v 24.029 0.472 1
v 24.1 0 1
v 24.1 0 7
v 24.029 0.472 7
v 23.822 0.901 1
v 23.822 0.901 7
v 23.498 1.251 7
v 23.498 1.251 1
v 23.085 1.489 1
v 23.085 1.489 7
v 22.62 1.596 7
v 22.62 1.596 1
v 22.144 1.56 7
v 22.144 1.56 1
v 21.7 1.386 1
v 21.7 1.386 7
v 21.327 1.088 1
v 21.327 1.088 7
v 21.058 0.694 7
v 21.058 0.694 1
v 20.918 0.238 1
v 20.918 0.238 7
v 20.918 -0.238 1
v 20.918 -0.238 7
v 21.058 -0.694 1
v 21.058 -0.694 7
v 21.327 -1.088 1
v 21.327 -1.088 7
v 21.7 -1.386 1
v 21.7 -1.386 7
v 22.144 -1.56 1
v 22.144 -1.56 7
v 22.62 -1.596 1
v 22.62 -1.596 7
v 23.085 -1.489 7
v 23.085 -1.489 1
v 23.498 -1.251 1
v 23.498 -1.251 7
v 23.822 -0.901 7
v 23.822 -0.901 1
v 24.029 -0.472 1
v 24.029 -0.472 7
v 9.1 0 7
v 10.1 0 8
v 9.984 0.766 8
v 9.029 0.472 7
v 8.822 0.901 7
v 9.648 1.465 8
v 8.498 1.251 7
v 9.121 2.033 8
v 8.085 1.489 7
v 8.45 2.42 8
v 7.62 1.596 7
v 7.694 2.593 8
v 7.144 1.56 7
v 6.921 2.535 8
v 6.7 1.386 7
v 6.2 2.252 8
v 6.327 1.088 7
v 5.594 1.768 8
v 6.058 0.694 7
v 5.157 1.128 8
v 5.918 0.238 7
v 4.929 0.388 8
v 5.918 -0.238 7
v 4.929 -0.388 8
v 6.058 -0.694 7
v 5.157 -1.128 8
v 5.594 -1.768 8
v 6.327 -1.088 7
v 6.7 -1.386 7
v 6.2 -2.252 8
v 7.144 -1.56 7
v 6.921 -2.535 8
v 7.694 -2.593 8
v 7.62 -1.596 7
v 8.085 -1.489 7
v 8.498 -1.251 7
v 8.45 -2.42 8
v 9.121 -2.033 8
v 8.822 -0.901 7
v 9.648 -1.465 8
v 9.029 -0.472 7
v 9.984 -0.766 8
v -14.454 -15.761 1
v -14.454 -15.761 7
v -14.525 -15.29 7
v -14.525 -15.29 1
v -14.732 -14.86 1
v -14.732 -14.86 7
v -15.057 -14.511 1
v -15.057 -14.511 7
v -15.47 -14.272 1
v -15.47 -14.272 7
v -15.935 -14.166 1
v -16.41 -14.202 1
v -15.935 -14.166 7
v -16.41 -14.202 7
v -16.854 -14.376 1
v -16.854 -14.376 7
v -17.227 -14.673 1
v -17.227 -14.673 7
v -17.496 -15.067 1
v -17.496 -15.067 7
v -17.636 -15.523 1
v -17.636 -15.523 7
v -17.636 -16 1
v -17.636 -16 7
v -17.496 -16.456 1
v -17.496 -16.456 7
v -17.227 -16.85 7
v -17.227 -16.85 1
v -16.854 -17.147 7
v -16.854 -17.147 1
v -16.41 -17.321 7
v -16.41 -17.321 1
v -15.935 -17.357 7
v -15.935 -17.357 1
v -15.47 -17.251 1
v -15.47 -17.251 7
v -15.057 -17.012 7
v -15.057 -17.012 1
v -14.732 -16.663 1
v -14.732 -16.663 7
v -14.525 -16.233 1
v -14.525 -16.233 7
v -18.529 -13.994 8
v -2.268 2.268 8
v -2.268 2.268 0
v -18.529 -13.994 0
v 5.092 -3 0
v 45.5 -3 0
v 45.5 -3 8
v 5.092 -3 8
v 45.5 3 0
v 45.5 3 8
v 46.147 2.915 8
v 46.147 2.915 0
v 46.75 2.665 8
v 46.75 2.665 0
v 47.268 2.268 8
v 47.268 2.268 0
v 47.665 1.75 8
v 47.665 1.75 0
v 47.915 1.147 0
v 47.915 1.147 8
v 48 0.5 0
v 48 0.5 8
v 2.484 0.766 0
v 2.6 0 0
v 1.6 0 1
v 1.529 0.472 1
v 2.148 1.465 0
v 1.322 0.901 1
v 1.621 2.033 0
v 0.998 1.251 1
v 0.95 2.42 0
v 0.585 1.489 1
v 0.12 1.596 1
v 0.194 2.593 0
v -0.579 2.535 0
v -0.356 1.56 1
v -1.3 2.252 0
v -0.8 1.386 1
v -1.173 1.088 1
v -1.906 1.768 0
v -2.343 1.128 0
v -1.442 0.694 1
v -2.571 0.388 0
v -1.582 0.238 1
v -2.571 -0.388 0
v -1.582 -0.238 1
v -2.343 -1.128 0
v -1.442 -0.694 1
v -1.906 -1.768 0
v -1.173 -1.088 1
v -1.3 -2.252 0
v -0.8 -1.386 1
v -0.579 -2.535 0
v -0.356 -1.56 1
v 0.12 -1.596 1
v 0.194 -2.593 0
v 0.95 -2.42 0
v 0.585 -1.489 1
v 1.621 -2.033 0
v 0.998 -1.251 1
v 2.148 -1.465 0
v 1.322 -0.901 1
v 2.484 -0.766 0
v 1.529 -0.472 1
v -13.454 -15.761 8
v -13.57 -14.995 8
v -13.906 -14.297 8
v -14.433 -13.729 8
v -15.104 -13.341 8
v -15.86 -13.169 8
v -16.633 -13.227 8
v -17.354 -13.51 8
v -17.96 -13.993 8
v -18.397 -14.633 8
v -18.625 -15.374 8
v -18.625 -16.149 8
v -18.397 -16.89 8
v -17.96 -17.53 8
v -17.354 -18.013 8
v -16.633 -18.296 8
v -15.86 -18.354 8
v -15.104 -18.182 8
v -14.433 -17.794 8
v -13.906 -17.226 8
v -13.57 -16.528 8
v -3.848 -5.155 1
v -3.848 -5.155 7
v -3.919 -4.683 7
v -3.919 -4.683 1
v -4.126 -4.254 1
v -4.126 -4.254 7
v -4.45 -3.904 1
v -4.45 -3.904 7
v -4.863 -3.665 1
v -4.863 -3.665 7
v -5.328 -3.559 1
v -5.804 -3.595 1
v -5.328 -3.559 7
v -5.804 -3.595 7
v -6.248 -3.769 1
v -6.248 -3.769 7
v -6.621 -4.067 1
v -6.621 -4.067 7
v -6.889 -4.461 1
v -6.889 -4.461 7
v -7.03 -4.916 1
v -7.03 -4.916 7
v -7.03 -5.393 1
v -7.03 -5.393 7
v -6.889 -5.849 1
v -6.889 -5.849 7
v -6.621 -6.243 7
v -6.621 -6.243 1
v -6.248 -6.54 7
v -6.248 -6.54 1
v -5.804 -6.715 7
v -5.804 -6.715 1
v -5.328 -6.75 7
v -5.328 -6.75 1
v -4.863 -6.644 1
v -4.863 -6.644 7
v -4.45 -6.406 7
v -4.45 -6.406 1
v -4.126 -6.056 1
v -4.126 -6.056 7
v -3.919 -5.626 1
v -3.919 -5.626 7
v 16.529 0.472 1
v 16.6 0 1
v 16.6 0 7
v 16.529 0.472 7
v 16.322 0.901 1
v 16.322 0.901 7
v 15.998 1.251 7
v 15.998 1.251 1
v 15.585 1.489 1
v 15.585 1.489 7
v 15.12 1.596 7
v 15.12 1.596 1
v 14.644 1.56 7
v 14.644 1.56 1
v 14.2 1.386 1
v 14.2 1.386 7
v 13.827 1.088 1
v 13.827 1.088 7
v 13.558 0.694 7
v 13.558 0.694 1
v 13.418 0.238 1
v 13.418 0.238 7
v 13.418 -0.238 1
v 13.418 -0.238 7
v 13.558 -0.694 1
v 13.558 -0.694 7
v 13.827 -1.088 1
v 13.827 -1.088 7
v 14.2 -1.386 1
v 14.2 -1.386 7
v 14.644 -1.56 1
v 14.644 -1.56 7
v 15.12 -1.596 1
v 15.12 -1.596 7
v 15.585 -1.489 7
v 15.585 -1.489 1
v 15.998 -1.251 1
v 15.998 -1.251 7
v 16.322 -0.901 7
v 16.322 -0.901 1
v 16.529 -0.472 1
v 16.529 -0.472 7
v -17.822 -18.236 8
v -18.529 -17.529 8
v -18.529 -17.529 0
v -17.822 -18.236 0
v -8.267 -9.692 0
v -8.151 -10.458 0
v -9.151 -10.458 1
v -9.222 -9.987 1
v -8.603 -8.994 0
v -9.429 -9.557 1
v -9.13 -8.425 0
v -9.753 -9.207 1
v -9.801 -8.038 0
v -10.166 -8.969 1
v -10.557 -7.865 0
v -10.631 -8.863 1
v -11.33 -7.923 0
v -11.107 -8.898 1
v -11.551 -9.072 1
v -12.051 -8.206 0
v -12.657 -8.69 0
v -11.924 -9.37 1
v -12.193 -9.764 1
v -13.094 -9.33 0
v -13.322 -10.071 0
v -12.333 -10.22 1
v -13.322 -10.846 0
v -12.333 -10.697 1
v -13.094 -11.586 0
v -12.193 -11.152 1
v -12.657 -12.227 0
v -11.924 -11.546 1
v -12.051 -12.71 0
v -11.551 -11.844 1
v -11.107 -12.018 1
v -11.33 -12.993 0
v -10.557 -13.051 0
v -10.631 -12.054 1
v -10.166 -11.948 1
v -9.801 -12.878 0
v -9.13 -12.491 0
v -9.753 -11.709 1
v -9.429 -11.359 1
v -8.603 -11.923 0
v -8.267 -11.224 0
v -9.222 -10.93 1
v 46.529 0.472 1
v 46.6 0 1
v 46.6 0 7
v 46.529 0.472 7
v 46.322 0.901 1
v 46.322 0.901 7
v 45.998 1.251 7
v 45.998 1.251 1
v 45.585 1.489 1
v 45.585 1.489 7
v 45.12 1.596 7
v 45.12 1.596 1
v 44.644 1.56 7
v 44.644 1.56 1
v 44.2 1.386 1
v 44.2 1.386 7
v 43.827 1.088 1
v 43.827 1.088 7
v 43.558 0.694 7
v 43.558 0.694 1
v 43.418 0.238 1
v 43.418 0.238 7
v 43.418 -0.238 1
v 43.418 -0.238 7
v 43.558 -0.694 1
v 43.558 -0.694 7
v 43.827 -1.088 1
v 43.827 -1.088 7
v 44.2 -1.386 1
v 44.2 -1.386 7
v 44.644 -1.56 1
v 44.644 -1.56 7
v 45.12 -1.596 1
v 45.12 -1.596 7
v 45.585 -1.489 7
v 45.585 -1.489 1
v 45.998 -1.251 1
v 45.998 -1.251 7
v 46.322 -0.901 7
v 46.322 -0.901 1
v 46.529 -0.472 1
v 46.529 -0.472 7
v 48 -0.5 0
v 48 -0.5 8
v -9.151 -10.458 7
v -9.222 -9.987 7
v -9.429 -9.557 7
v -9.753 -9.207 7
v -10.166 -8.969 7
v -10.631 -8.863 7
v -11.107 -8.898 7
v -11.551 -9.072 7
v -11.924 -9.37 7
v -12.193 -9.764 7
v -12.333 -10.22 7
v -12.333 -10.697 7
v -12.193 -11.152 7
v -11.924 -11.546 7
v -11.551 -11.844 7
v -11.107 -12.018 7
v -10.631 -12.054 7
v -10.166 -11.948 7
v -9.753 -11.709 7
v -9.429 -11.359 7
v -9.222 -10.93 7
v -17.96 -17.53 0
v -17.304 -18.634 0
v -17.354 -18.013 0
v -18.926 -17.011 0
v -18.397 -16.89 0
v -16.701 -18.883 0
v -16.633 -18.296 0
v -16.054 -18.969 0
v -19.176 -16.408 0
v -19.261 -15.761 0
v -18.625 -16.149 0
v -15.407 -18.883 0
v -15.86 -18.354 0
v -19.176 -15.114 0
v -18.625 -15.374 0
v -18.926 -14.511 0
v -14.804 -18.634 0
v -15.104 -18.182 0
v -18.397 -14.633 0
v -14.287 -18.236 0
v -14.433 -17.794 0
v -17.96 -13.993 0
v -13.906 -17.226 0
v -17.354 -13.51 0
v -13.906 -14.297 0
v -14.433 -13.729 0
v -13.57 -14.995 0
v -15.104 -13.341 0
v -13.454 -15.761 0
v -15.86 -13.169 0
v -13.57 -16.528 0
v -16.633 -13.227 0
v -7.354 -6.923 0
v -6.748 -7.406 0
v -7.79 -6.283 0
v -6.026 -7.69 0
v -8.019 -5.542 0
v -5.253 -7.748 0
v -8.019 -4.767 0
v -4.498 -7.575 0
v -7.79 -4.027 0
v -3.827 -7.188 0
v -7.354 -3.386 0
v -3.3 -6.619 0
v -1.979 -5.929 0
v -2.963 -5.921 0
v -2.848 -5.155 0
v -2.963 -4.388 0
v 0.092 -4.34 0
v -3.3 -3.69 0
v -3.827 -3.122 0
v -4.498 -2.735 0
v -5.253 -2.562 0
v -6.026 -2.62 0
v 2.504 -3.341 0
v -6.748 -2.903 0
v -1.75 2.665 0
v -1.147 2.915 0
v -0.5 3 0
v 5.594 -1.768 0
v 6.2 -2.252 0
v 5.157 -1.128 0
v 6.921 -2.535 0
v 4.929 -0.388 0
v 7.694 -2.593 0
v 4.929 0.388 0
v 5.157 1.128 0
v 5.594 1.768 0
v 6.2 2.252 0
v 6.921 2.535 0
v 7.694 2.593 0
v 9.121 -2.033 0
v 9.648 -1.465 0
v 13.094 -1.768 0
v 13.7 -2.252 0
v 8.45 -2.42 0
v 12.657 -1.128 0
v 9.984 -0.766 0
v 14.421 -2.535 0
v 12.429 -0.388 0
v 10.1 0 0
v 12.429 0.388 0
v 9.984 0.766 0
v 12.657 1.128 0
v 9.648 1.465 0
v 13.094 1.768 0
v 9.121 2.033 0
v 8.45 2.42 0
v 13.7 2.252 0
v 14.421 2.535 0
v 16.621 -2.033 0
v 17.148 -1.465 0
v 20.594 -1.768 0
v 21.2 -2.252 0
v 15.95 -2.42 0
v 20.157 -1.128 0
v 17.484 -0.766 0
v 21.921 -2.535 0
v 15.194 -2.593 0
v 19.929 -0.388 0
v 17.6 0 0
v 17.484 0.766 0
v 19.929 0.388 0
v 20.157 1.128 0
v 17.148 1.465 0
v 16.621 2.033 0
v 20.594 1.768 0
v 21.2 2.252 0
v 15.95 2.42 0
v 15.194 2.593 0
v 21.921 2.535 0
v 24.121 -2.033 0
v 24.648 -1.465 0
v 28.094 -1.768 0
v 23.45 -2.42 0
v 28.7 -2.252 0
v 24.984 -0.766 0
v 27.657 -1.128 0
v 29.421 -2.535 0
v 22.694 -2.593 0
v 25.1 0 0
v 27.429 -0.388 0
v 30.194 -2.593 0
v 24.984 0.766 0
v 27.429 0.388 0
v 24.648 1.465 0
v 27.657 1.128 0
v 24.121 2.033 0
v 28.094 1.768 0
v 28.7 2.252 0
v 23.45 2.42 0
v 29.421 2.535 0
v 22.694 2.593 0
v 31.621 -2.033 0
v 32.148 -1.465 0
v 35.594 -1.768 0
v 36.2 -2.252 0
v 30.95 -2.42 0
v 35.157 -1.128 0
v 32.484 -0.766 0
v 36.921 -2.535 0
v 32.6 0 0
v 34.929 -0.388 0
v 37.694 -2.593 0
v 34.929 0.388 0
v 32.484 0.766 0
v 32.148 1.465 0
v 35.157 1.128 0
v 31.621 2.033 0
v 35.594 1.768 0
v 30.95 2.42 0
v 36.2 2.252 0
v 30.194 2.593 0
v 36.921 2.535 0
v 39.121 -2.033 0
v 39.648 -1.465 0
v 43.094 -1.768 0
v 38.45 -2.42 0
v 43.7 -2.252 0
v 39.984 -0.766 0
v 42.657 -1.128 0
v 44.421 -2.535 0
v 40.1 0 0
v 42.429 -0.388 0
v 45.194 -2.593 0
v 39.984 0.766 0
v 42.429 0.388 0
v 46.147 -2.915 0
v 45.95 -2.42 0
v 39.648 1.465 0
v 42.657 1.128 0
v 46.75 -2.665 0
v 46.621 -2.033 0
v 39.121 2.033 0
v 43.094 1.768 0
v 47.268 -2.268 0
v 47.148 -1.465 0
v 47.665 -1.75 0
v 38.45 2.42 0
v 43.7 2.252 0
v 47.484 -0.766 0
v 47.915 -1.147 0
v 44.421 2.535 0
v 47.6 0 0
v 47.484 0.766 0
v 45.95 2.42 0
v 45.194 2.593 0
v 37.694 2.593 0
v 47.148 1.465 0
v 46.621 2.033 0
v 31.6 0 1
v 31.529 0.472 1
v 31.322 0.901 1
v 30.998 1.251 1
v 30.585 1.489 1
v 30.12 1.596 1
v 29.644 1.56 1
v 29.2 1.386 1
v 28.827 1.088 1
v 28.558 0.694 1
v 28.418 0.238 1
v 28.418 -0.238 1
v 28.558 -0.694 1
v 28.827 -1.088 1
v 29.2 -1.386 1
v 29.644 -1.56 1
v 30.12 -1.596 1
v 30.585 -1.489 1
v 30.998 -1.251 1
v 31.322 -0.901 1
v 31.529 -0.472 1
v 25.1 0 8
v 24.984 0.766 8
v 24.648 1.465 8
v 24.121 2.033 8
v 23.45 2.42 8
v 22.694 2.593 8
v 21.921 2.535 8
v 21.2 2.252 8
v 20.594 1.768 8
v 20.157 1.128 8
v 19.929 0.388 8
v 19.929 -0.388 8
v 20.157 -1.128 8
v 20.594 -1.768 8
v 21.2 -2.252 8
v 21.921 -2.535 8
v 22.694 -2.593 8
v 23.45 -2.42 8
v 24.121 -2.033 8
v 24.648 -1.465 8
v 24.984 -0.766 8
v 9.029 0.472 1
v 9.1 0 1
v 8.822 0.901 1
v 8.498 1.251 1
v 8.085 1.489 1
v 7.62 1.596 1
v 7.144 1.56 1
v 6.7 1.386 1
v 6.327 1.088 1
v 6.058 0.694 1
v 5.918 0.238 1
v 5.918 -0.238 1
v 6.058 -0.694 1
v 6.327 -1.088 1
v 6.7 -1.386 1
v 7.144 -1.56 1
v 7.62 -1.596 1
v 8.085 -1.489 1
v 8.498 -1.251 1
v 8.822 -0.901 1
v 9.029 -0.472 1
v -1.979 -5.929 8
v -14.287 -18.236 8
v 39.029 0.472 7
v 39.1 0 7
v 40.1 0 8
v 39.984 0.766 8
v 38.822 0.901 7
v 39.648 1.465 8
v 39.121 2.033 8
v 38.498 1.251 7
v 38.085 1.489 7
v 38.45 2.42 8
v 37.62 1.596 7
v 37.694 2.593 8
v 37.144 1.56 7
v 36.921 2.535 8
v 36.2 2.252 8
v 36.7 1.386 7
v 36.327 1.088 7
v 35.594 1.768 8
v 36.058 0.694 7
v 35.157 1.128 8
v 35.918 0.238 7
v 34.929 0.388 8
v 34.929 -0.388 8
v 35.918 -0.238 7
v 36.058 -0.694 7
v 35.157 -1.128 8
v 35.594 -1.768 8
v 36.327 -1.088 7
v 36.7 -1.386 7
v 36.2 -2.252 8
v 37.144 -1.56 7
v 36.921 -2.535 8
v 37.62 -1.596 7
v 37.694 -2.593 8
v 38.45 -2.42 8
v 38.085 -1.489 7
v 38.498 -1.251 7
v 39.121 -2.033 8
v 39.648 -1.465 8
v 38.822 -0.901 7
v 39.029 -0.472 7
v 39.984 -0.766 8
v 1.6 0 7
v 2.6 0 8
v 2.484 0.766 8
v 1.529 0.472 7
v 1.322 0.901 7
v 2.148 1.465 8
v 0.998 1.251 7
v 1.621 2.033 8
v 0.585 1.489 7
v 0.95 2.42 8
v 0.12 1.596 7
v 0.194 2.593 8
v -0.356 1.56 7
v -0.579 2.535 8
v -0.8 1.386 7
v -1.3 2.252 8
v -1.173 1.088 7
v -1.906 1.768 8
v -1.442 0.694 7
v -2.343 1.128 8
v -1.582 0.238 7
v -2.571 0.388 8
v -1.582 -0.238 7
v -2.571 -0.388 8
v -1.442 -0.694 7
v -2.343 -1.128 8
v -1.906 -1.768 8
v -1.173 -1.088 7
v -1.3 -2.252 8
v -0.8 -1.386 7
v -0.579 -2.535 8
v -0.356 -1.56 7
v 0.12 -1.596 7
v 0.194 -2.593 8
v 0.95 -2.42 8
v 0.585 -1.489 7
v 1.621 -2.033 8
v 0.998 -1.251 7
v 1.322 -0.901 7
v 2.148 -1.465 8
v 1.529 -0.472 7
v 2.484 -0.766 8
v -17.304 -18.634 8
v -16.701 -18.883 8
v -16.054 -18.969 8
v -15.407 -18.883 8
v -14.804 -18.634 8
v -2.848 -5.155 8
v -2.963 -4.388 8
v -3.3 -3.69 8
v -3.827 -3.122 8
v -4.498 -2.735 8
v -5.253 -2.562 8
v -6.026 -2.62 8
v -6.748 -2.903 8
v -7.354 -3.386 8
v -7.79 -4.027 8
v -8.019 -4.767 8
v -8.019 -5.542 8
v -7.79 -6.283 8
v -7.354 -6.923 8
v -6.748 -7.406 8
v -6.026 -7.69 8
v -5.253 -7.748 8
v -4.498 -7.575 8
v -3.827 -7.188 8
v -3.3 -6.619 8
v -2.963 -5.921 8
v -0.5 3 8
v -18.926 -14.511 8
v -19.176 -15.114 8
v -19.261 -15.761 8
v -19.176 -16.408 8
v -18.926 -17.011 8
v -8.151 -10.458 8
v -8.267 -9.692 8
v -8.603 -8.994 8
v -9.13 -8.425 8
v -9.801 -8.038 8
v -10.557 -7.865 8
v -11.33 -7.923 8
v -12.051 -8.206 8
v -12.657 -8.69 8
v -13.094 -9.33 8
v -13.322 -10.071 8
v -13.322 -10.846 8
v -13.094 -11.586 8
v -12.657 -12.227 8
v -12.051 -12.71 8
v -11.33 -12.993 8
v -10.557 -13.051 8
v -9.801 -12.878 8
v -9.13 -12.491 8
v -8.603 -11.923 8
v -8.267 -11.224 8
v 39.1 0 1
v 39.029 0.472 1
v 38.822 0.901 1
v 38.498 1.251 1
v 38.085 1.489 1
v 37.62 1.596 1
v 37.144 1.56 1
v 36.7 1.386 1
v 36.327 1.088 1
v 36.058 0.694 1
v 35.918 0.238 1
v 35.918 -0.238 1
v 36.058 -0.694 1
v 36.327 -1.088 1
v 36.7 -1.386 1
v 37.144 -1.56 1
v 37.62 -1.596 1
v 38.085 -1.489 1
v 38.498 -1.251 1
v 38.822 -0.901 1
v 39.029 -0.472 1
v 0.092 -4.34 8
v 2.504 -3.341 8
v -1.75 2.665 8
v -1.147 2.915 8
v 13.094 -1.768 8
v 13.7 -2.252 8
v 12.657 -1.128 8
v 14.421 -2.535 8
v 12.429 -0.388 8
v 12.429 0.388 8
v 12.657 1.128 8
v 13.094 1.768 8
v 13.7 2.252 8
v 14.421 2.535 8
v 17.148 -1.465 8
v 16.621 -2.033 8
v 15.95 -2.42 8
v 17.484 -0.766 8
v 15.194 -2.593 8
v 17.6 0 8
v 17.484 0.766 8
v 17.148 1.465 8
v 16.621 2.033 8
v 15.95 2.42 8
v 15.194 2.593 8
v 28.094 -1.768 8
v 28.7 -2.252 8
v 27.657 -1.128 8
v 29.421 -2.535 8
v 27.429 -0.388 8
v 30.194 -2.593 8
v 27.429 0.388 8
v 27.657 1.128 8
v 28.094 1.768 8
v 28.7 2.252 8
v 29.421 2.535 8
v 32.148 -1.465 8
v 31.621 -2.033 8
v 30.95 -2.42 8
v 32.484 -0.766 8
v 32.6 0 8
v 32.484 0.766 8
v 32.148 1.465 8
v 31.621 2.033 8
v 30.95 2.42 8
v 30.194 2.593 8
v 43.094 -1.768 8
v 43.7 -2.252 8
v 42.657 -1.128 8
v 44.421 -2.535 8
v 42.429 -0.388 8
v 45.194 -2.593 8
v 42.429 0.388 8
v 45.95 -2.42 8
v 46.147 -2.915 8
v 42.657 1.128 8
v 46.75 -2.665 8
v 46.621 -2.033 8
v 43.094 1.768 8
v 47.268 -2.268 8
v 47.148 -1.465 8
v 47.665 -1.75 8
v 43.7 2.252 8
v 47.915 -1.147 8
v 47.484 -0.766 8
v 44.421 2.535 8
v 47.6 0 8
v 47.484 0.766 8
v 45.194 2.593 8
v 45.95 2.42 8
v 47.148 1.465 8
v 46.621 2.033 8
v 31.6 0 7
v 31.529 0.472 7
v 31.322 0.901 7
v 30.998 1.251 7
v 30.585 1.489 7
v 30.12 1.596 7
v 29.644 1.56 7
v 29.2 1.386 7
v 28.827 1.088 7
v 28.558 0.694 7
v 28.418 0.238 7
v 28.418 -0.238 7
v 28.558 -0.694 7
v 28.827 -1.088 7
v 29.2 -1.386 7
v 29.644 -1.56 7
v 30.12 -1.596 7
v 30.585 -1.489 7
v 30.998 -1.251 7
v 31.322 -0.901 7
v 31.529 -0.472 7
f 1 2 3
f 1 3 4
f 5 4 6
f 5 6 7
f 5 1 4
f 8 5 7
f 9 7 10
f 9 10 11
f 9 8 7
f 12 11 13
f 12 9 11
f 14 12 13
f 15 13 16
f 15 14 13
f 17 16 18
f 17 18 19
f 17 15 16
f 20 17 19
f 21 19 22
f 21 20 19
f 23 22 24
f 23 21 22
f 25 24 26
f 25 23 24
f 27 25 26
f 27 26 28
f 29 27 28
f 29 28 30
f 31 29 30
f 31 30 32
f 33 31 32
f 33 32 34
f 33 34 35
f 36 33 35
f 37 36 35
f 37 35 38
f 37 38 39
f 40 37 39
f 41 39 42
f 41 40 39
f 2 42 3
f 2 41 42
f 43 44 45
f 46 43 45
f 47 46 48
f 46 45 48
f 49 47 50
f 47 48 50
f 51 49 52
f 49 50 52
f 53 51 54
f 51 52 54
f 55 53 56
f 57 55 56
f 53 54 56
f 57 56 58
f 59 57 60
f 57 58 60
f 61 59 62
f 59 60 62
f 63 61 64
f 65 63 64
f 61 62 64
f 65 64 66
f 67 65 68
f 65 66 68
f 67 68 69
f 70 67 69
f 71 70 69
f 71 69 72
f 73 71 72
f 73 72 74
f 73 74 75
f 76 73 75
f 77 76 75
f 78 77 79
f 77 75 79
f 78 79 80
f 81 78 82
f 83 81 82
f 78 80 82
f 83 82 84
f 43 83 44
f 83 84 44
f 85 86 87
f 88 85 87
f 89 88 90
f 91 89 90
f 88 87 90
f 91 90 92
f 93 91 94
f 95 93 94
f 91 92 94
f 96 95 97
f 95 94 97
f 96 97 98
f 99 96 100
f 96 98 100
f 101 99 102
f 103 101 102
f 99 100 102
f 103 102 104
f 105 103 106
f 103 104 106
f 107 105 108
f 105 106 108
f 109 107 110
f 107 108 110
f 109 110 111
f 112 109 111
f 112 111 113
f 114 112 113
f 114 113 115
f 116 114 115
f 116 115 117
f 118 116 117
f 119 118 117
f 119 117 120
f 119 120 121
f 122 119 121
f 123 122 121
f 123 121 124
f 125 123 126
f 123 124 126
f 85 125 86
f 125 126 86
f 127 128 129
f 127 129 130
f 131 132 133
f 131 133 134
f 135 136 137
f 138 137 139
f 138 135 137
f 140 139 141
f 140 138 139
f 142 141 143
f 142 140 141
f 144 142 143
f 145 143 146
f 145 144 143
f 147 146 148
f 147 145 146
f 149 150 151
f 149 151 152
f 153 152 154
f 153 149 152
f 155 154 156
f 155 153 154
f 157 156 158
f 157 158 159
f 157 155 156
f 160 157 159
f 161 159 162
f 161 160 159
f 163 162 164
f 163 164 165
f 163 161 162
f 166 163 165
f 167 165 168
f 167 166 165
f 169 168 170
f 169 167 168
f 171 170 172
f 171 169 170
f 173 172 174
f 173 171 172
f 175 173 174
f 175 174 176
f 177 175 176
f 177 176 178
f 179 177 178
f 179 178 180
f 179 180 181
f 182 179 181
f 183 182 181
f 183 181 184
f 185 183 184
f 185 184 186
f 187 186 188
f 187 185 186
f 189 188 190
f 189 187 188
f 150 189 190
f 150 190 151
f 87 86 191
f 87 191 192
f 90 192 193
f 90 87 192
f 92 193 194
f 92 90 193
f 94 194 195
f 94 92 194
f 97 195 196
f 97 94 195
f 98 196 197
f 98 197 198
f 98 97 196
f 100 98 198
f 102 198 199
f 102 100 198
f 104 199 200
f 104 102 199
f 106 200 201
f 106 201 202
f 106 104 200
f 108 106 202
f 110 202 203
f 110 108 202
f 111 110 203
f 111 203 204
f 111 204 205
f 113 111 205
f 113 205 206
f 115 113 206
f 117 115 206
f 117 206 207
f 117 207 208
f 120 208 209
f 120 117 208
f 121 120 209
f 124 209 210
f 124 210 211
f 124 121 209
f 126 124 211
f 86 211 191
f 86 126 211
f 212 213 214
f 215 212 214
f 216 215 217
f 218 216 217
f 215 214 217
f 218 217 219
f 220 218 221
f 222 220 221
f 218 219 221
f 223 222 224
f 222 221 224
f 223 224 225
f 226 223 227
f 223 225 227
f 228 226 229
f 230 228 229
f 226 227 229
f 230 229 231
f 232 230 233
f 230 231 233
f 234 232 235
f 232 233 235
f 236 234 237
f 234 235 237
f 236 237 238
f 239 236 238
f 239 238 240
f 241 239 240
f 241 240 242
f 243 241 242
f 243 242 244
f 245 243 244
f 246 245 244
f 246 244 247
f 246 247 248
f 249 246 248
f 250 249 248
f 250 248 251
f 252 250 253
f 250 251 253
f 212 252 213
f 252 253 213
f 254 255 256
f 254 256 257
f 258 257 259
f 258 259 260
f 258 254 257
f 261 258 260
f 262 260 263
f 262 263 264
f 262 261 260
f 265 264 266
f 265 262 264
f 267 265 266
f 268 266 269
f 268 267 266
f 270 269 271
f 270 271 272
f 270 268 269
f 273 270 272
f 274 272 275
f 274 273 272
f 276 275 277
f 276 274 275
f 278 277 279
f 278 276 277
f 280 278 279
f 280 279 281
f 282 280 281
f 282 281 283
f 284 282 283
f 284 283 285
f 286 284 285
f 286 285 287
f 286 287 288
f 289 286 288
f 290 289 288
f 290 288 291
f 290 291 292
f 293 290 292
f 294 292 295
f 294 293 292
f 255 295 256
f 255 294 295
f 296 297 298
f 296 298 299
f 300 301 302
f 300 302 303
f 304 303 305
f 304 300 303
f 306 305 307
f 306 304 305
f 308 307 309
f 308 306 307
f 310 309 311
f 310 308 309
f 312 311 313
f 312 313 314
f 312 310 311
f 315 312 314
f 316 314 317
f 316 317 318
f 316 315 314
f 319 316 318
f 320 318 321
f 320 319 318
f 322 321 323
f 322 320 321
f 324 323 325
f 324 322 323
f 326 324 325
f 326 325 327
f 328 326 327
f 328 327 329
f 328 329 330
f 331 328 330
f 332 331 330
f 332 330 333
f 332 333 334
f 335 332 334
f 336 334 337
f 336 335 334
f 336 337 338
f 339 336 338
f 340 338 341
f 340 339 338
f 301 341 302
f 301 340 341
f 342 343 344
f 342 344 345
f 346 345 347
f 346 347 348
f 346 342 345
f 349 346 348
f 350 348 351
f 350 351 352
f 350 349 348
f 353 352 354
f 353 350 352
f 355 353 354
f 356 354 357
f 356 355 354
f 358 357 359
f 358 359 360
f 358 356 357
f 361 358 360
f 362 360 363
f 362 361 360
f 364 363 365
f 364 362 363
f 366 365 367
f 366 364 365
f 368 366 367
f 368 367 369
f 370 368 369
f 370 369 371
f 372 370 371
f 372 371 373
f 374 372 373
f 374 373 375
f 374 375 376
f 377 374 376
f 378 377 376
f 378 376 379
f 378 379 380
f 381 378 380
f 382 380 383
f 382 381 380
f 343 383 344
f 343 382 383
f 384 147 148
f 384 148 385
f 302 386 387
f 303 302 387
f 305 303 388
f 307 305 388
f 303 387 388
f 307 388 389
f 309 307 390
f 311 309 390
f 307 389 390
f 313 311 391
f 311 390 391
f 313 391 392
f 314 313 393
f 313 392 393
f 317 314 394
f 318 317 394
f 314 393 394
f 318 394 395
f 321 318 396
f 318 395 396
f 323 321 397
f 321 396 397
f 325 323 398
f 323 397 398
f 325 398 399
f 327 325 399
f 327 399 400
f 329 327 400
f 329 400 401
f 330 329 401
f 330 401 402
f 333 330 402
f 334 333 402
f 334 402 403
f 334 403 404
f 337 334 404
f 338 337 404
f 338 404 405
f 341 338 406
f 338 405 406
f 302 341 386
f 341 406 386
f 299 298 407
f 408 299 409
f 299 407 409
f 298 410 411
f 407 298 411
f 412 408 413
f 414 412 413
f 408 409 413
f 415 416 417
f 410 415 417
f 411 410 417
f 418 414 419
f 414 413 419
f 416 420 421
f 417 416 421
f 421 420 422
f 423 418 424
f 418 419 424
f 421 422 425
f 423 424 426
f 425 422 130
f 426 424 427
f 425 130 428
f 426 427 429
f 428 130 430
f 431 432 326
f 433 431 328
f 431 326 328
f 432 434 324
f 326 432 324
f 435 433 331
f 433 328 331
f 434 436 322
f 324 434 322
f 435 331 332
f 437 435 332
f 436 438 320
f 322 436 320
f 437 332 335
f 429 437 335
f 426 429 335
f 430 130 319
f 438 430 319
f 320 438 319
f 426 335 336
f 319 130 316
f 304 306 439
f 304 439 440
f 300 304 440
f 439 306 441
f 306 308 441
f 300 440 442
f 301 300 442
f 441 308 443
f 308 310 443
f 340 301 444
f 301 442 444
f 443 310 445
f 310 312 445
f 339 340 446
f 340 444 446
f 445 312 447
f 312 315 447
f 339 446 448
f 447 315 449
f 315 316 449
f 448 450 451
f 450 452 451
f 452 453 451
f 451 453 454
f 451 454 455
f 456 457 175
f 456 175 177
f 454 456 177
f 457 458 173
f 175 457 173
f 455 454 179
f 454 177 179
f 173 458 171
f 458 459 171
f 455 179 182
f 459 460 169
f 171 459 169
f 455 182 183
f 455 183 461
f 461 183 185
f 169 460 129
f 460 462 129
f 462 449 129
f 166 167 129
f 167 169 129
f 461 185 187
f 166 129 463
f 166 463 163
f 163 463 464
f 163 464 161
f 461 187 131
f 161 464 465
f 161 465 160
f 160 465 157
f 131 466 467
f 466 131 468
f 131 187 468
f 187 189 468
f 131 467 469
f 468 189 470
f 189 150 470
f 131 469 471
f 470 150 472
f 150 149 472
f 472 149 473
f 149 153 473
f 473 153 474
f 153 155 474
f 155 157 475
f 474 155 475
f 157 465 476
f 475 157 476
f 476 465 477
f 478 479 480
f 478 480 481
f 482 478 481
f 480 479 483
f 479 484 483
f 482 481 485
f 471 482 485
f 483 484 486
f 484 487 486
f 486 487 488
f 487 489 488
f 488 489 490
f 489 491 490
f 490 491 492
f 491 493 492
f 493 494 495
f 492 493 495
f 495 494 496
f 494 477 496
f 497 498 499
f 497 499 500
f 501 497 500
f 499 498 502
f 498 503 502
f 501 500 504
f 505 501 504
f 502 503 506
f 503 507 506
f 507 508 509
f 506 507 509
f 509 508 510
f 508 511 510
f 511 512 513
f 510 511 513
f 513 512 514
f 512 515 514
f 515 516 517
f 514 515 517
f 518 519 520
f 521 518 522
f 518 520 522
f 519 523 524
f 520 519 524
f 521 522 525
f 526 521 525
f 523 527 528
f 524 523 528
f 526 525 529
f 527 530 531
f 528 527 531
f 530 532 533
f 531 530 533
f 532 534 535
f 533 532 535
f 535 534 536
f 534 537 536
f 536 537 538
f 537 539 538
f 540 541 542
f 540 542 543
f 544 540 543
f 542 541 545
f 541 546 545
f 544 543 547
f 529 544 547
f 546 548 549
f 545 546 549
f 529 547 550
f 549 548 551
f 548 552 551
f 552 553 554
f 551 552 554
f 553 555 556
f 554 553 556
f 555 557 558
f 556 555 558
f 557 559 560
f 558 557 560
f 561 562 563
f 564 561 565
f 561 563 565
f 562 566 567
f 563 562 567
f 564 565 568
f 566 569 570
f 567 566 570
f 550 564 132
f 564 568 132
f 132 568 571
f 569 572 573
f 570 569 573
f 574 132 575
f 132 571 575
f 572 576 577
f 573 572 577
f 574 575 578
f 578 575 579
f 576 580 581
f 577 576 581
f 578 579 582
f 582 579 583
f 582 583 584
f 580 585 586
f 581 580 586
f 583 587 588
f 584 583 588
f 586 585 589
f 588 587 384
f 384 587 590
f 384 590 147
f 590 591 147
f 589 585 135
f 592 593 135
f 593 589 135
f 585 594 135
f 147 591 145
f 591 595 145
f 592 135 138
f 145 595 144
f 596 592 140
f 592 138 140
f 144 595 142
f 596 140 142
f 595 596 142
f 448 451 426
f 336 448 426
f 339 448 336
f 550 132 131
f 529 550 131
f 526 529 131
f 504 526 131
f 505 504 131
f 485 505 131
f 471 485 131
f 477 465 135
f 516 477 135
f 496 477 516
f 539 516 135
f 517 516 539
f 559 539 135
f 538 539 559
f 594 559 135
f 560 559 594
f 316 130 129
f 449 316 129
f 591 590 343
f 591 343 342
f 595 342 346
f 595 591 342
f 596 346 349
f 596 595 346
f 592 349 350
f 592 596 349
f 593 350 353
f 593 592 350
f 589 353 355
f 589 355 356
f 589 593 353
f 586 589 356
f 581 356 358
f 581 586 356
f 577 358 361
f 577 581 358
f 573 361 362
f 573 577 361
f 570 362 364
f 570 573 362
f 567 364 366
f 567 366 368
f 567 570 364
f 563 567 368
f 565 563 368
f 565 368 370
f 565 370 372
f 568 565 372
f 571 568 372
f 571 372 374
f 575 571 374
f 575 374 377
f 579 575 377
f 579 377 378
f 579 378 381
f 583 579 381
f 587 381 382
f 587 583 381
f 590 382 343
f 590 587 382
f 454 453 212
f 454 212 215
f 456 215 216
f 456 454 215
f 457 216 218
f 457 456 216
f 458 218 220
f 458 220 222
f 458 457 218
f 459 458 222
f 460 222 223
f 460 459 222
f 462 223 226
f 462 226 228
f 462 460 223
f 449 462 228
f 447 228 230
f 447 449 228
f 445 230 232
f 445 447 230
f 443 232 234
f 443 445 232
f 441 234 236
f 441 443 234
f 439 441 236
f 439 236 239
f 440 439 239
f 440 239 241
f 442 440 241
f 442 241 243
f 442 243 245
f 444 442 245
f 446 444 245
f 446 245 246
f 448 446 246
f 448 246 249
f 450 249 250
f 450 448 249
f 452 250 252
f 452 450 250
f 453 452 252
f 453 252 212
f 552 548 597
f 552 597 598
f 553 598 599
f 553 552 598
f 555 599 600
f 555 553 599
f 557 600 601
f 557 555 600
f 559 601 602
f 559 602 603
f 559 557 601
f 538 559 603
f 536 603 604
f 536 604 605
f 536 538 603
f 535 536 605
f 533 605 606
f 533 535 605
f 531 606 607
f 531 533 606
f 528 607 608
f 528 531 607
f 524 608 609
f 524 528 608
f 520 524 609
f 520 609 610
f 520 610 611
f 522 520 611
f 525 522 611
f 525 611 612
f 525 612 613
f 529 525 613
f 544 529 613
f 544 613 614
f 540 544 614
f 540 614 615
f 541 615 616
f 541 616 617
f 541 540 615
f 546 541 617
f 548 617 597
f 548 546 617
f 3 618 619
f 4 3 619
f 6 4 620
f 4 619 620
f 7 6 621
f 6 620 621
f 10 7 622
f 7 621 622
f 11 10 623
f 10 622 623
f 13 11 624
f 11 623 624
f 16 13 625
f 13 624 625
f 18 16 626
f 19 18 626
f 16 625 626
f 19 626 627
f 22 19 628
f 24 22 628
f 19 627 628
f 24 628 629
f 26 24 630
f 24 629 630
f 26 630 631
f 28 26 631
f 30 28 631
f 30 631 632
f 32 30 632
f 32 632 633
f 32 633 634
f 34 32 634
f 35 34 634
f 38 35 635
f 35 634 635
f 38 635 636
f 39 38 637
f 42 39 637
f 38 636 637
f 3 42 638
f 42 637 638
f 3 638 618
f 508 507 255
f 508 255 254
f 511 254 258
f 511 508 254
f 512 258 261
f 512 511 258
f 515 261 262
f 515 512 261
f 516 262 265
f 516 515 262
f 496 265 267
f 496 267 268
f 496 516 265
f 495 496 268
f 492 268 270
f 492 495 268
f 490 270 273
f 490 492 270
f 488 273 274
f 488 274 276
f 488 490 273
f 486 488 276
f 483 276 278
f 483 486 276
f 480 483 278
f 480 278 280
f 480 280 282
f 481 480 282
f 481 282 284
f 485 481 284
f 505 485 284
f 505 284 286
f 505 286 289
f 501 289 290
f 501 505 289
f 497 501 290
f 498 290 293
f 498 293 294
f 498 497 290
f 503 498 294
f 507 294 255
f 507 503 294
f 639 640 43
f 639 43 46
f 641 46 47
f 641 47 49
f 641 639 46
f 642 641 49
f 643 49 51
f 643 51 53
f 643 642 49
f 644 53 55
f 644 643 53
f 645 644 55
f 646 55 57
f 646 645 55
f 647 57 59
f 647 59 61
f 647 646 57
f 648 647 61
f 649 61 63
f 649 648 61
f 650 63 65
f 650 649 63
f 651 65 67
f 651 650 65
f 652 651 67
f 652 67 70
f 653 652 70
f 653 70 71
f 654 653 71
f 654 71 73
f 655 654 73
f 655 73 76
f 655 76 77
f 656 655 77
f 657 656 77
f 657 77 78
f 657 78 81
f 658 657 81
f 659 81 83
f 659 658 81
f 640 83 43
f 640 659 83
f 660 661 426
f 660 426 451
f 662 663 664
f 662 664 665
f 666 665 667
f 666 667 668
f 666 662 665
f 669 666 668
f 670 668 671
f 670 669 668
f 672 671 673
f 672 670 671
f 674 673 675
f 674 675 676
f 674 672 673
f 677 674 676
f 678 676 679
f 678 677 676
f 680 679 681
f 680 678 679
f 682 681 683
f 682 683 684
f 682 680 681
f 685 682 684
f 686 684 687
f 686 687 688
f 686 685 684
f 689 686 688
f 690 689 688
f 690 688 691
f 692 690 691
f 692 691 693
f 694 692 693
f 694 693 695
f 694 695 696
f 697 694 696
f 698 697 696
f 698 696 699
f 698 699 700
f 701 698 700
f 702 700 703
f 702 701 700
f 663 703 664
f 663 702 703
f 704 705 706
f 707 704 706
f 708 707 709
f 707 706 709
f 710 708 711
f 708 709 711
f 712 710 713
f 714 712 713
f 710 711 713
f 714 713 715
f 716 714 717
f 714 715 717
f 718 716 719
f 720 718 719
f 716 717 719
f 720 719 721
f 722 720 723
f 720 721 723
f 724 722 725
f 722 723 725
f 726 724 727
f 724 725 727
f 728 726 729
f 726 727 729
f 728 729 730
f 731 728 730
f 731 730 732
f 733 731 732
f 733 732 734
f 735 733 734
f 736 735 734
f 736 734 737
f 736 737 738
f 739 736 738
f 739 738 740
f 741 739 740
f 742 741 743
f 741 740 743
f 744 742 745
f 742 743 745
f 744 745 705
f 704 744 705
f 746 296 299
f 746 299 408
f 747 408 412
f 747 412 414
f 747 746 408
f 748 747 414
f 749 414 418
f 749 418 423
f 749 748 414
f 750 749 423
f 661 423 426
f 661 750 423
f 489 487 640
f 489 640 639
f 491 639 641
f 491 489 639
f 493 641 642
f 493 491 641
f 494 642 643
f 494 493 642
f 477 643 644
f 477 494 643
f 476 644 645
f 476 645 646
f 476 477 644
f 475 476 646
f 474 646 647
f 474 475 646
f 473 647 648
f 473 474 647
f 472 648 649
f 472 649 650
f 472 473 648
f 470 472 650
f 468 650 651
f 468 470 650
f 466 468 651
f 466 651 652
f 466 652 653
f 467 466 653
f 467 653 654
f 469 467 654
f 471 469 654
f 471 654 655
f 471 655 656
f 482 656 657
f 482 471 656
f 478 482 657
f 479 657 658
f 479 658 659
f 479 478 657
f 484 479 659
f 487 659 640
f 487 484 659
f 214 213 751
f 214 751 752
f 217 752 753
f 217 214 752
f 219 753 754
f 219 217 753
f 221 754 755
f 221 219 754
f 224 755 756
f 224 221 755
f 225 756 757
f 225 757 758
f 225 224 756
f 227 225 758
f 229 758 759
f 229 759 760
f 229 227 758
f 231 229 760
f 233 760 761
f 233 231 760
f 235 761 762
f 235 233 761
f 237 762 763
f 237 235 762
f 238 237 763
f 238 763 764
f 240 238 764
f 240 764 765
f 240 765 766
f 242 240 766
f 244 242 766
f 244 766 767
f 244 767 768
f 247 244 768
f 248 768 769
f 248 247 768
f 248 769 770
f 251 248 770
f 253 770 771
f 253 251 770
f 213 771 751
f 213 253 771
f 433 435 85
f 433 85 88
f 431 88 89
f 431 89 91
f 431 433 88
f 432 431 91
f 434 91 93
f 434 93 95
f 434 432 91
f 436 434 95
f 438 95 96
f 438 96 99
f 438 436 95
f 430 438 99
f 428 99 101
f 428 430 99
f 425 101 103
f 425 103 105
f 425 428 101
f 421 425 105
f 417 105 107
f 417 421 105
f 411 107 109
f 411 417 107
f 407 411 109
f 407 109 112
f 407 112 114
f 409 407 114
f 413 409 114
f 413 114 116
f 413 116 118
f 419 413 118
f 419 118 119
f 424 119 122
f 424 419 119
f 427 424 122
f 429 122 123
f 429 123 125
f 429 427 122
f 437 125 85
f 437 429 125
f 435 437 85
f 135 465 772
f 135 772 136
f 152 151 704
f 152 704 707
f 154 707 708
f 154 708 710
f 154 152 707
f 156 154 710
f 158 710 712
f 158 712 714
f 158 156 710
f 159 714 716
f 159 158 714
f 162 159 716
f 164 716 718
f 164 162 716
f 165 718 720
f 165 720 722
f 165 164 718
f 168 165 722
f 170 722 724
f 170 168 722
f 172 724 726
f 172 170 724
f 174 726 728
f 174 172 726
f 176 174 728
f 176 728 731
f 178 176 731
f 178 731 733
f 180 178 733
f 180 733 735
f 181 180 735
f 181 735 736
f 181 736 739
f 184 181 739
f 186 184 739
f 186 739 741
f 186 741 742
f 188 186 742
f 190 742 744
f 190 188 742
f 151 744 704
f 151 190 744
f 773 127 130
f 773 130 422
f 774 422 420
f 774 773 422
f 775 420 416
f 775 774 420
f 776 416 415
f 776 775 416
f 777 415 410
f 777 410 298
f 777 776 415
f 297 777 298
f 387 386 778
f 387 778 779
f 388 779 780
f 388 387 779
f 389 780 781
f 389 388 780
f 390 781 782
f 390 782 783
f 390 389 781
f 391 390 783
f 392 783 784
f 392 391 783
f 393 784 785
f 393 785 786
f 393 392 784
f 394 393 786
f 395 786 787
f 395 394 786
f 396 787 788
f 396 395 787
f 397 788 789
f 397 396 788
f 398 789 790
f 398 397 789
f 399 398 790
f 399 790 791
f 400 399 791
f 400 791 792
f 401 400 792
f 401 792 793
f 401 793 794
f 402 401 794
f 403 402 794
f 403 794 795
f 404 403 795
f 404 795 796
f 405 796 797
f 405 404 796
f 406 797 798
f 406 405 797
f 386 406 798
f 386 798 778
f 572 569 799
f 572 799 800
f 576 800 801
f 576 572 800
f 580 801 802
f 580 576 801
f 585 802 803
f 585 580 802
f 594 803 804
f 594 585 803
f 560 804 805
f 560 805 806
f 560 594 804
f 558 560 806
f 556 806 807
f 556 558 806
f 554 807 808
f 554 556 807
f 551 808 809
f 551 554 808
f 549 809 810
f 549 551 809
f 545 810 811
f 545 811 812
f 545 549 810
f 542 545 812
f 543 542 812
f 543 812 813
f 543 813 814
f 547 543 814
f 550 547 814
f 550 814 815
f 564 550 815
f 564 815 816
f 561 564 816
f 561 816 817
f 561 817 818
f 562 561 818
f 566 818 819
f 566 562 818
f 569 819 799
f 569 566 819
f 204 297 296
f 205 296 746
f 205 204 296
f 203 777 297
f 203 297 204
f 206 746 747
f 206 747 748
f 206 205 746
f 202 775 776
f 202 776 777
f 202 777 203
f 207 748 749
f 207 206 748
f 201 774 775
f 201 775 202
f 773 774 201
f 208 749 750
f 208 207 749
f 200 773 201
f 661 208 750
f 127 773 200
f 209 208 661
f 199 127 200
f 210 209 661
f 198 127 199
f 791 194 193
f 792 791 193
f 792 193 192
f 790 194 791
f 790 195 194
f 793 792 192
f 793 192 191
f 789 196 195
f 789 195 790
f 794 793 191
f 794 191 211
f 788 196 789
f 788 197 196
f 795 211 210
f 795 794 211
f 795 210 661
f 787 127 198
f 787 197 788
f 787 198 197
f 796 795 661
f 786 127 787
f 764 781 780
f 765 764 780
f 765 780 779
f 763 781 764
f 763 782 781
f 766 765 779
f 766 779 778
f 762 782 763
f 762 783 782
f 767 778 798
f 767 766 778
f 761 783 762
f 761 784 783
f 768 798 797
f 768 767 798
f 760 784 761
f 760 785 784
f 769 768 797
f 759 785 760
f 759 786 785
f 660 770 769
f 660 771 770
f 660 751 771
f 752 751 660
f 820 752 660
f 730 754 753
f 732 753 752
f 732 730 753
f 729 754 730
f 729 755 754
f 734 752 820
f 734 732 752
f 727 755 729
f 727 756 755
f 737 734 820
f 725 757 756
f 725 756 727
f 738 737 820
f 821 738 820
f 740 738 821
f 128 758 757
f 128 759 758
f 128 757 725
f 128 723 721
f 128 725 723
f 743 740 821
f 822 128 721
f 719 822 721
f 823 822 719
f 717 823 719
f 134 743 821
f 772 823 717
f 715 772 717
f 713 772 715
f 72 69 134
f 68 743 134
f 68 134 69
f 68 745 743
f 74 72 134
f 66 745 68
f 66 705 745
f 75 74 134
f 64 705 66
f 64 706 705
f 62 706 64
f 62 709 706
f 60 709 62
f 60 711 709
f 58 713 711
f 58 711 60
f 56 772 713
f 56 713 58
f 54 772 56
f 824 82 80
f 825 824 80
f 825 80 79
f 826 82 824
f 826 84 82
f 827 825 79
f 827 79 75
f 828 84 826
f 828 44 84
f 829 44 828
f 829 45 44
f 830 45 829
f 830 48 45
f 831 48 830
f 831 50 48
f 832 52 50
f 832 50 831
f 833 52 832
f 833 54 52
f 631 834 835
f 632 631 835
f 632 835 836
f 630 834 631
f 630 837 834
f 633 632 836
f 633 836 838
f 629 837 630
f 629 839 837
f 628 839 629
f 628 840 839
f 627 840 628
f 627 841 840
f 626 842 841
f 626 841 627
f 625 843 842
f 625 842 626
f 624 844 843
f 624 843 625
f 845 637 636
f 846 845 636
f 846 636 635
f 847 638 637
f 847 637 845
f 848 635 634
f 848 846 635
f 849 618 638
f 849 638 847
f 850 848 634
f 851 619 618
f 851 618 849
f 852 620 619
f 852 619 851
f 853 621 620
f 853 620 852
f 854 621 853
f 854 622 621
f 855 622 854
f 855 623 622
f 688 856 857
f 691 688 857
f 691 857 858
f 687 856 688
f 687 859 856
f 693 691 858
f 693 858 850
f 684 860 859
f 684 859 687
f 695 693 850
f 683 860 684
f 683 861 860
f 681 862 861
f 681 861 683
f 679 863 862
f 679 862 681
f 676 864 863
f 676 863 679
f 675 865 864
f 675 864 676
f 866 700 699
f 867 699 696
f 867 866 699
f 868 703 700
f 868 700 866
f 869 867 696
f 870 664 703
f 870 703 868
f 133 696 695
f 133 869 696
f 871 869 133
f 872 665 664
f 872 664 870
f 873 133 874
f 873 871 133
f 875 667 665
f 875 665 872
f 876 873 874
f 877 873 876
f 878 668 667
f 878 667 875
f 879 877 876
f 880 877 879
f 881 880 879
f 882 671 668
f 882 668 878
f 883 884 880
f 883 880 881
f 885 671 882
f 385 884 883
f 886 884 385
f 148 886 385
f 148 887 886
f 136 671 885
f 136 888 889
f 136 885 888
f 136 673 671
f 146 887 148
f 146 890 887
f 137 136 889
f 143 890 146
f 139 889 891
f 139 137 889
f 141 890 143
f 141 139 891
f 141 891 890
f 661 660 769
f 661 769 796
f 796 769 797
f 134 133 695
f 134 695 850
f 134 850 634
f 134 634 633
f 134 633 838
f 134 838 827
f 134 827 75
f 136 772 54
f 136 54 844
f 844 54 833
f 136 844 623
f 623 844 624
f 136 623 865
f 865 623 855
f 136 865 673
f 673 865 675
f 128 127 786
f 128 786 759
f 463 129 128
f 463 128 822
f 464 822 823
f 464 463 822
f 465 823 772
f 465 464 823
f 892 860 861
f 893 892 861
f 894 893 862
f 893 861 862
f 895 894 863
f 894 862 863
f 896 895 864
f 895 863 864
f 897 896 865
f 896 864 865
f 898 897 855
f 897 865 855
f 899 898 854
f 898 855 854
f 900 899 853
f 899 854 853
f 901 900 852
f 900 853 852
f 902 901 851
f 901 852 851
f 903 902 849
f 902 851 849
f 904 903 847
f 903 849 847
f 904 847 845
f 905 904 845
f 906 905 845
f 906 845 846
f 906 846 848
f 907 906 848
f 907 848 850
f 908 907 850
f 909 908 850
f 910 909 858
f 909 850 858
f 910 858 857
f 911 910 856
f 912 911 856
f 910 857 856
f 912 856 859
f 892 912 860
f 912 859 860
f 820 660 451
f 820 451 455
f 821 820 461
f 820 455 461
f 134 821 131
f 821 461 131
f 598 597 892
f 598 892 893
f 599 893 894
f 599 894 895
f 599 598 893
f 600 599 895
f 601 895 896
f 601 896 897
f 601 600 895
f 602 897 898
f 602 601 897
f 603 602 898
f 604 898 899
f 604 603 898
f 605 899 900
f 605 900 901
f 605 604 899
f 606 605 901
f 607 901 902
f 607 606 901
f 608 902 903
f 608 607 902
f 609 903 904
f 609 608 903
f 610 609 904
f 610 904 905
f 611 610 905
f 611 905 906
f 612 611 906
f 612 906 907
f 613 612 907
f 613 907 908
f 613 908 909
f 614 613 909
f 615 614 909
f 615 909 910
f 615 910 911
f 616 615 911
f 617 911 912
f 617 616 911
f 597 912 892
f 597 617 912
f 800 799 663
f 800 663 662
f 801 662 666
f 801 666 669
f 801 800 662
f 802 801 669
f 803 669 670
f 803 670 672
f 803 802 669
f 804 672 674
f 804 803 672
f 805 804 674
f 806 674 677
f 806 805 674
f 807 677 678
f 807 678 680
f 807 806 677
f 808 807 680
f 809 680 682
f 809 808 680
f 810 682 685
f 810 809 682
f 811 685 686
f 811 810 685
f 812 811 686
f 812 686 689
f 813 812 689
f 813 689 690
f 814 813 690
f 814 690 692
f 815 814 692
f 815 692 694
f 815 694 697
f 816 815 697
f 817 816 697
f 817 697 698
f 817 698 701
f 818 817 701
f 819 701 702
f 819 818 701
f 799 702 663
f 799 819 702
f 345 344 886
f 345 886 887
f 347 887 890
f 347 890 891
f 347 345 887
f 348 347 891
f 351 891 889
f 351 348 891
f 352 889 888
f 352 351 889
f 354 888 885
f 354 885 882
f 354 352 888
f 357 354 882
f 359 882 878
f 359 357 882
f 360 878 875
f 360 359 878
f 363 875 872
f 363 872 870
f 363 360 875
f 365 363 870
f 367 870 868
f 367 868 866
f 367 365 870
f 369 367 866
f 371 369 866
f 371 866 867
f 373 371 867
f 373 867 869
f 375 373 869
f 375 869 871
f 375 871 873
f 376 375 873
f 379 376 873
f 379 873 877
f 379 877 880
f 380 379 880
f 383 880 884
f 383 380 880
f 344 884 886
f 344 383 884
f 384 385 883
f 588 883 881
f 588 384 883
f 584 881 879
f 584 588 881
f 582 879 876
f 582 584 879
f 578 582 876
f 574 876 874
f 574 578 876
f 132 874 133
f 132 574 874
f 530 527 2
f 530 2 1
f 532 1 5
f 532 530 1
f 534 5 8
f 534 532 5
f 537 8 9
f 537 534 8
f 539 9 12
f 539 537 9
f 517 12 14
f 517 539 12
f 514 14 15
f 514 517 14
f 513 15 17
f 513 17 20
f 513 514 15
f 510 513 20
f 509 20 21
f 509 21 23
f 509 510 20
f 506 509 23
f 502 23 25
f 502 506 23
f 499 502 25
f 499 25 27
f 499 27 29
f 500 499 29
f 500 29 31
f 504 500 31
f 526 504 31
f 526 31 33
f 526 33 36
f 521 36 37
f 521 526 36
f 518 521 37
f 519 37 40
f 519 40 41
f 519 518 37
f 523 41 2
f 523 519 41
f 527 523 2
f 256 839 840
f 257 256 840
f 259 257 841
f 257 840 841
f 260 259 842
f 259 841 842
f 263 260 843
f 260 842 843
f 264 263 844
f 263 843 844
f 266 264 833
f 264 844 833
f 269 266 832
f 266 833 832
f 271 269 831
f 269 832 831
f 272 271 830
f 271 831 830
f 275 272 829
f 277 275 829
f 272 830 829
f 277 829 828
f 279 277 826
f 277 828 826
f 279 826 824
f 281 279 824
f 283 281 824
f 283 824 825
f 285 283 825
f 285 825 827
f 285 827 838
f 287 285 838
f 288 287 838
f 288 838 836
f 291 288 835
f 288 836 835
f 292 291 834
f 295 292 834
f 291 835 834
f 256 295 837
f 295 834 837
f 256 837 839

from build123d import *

# Parameters (mm, degrees)
SKETCH1_R           = 1.6
BOSS_EXTRUDE1_DEPTH = 8
CHAMFER1_SIZE       = 1
SKETCH2_R           = 1.6
BOSS_EXTRUDE3_DEPTH = 8
FILLET1_R           = 10
CHAMFER2_SIZE       = 1
CHAMFER3_SIZE       = 1


with BuildPart() as part:
    # Sketch1 → Boss-Extrude1 (new body)
    with BuildSketch(Plane.XY):
        with BuildLine():
            Line((-0.5, 3), (45.5, 3))
            ThreePointArc((45.5, 3), (47.267766953, 2.267766953), (48, 0.5))
            Line((48, 0.5), (48, -0.5))
            ThreePointArc((48, -0.5), (47.267766953, -2.267766953), (45.5, -3))
            Line((45.5, -3), (-0.5, -3))
            ThreePointArc((-0.5, -3), (-2.267766953, -2.267766953), (-3, -0.5))
            Line((-3, -0.5), (-3, 0.5))
            ThreePointArc((-3, 0.5), (-2.267766953, 2.267766953), (-0.5, 3))
        make_face()
        Circle(SKETCH1_R, mode=Mode.SUBTRACT)
        with Locations((7.5, 0)):
            Circle(SKETCH1_R, mode=Mode.SUBTRACT)
        with Locations((15, 0)):
            Circle(SKETCH1_R, mode=Mode.SUBTRACT)
        with Locations((22.5, 0)):
            Circle(SKETCH1_R, mode=Mode.SUBTRACT)
        with Locations((30, 0)):
            Circle(SKETCH1_R, mode=Mode.SUBTRACT)
        with Locations((37.5, 0)):
            Circle(SKETCH1_R, mode=Mode.SUBTRACT)
        with Locations((45, 0)):
            Circle(SKETCH1_R, mode=Mode.SUBTRACT)
    extrude(amount=BOSS_EXTRUDE1_DEPTH)

    # Chamfer1
    chamfer1_edges = [part.edges().sort_by_distance(p)[0] for p in [
        (-1.6, 0, 0),
        (-1.6, 0, 8),
        (5.9, 0, 0),
        (5.9, 0, 8),
        (13.4, 0, 0),
        (13.4, 0, 8),
        (20.9, 0, 0),
        (20.9, 0, 8),
        (28.4, 0, 0),
        (28.4, 0, 8),
    ]]
    chamfer(chamfer1_edges, length=CHAMFER1_SIZE)

    # Sketch2 → Boss-Extrude3 (add)
    with BuildSketch(Plane.XY.offset(8)):
        with BuildLine():
            ThreePointArc((-3, 0.5), (-2.809698831, 1.456708581), (-2.267766953, 2.267766953))
            Line((-2.267766953, 2.267766953), (-18.529200529, -13.993666623))
            ThreePointArc((-18.529200529, -13.993666623), (-19.261433576, -15.761433576), (-18.529200529, -17.529200529))
            Line((-18.529200529, -17.529200529), (-17.822093748, -18.23630731))
            ThreePointArc((-17.822093748, -18.23630731), (-16.054326795, -18.968540357), (-14.286559842, -18.23630731))
            Line((-14.286559842, -18.23630731), (0.949747468, -3))
            Line((0.949747468, -3), (-0.5, -3))
            ThreePointArc((-0.5, -3), (-2.267766953, -2.267766953), (-3, -0.5))
            Line((-3, -0.5), (-3, 0.5))
        make_face()
        with Locations((-16.054326795, -15.761433576)):
            Circle(SKETCH2_R, mode=Mode.SUBTRACT)
        with Locations((-10.751025936, -10.458132717)):
            Circle(SKETCH2_R, mode=Mode.SUBTRACT)
        with Locations((-5.447725077, -5.154831858)):
            Circle(SKETCH2_R, mode=Mode.SUBTRACT)
    extrude(amount=-BOSS_EXTRUDE3_DEPTH)

    # Fillet1
    fillet1_edges = [part.edges().sort_by_distance(p)[0] for p in [
        (0.949747468, -3, 4),
    ]]
    fillet(fillet1_edges, radius=FILLET1_R)

    # Chamfer2
    chamfer2_edges = [part.edges().sort_by_distance(p)[0] for p in [
        (-17.654326795, -15.761433576, 8),
        (-12.351025936, -10.458132717, 8),
        (-7.047725077, -5.154831858, 8),
        (-7.047725077, -5.154831858, 0),
        (-12.351025936, -10.458132717, 0),
        (-17.654326795, -15.761433576, 0),
    ]]
    chamfer(chamfer2_edges, length=CHAMFER2_SIZE)

    # Chamfer3
    chamfer3_edges = [part.edges().sort_by_distance(p)[0] for p in [
        (35.9, 0, 0),
        (35.9, 0, 8),
        (43.4, 0, 0),
        (43.4, 0, 8),
    ]]
    chamfer(chamfer3_edges, length=CHAMFER3_SIZE)


solid = part.part
